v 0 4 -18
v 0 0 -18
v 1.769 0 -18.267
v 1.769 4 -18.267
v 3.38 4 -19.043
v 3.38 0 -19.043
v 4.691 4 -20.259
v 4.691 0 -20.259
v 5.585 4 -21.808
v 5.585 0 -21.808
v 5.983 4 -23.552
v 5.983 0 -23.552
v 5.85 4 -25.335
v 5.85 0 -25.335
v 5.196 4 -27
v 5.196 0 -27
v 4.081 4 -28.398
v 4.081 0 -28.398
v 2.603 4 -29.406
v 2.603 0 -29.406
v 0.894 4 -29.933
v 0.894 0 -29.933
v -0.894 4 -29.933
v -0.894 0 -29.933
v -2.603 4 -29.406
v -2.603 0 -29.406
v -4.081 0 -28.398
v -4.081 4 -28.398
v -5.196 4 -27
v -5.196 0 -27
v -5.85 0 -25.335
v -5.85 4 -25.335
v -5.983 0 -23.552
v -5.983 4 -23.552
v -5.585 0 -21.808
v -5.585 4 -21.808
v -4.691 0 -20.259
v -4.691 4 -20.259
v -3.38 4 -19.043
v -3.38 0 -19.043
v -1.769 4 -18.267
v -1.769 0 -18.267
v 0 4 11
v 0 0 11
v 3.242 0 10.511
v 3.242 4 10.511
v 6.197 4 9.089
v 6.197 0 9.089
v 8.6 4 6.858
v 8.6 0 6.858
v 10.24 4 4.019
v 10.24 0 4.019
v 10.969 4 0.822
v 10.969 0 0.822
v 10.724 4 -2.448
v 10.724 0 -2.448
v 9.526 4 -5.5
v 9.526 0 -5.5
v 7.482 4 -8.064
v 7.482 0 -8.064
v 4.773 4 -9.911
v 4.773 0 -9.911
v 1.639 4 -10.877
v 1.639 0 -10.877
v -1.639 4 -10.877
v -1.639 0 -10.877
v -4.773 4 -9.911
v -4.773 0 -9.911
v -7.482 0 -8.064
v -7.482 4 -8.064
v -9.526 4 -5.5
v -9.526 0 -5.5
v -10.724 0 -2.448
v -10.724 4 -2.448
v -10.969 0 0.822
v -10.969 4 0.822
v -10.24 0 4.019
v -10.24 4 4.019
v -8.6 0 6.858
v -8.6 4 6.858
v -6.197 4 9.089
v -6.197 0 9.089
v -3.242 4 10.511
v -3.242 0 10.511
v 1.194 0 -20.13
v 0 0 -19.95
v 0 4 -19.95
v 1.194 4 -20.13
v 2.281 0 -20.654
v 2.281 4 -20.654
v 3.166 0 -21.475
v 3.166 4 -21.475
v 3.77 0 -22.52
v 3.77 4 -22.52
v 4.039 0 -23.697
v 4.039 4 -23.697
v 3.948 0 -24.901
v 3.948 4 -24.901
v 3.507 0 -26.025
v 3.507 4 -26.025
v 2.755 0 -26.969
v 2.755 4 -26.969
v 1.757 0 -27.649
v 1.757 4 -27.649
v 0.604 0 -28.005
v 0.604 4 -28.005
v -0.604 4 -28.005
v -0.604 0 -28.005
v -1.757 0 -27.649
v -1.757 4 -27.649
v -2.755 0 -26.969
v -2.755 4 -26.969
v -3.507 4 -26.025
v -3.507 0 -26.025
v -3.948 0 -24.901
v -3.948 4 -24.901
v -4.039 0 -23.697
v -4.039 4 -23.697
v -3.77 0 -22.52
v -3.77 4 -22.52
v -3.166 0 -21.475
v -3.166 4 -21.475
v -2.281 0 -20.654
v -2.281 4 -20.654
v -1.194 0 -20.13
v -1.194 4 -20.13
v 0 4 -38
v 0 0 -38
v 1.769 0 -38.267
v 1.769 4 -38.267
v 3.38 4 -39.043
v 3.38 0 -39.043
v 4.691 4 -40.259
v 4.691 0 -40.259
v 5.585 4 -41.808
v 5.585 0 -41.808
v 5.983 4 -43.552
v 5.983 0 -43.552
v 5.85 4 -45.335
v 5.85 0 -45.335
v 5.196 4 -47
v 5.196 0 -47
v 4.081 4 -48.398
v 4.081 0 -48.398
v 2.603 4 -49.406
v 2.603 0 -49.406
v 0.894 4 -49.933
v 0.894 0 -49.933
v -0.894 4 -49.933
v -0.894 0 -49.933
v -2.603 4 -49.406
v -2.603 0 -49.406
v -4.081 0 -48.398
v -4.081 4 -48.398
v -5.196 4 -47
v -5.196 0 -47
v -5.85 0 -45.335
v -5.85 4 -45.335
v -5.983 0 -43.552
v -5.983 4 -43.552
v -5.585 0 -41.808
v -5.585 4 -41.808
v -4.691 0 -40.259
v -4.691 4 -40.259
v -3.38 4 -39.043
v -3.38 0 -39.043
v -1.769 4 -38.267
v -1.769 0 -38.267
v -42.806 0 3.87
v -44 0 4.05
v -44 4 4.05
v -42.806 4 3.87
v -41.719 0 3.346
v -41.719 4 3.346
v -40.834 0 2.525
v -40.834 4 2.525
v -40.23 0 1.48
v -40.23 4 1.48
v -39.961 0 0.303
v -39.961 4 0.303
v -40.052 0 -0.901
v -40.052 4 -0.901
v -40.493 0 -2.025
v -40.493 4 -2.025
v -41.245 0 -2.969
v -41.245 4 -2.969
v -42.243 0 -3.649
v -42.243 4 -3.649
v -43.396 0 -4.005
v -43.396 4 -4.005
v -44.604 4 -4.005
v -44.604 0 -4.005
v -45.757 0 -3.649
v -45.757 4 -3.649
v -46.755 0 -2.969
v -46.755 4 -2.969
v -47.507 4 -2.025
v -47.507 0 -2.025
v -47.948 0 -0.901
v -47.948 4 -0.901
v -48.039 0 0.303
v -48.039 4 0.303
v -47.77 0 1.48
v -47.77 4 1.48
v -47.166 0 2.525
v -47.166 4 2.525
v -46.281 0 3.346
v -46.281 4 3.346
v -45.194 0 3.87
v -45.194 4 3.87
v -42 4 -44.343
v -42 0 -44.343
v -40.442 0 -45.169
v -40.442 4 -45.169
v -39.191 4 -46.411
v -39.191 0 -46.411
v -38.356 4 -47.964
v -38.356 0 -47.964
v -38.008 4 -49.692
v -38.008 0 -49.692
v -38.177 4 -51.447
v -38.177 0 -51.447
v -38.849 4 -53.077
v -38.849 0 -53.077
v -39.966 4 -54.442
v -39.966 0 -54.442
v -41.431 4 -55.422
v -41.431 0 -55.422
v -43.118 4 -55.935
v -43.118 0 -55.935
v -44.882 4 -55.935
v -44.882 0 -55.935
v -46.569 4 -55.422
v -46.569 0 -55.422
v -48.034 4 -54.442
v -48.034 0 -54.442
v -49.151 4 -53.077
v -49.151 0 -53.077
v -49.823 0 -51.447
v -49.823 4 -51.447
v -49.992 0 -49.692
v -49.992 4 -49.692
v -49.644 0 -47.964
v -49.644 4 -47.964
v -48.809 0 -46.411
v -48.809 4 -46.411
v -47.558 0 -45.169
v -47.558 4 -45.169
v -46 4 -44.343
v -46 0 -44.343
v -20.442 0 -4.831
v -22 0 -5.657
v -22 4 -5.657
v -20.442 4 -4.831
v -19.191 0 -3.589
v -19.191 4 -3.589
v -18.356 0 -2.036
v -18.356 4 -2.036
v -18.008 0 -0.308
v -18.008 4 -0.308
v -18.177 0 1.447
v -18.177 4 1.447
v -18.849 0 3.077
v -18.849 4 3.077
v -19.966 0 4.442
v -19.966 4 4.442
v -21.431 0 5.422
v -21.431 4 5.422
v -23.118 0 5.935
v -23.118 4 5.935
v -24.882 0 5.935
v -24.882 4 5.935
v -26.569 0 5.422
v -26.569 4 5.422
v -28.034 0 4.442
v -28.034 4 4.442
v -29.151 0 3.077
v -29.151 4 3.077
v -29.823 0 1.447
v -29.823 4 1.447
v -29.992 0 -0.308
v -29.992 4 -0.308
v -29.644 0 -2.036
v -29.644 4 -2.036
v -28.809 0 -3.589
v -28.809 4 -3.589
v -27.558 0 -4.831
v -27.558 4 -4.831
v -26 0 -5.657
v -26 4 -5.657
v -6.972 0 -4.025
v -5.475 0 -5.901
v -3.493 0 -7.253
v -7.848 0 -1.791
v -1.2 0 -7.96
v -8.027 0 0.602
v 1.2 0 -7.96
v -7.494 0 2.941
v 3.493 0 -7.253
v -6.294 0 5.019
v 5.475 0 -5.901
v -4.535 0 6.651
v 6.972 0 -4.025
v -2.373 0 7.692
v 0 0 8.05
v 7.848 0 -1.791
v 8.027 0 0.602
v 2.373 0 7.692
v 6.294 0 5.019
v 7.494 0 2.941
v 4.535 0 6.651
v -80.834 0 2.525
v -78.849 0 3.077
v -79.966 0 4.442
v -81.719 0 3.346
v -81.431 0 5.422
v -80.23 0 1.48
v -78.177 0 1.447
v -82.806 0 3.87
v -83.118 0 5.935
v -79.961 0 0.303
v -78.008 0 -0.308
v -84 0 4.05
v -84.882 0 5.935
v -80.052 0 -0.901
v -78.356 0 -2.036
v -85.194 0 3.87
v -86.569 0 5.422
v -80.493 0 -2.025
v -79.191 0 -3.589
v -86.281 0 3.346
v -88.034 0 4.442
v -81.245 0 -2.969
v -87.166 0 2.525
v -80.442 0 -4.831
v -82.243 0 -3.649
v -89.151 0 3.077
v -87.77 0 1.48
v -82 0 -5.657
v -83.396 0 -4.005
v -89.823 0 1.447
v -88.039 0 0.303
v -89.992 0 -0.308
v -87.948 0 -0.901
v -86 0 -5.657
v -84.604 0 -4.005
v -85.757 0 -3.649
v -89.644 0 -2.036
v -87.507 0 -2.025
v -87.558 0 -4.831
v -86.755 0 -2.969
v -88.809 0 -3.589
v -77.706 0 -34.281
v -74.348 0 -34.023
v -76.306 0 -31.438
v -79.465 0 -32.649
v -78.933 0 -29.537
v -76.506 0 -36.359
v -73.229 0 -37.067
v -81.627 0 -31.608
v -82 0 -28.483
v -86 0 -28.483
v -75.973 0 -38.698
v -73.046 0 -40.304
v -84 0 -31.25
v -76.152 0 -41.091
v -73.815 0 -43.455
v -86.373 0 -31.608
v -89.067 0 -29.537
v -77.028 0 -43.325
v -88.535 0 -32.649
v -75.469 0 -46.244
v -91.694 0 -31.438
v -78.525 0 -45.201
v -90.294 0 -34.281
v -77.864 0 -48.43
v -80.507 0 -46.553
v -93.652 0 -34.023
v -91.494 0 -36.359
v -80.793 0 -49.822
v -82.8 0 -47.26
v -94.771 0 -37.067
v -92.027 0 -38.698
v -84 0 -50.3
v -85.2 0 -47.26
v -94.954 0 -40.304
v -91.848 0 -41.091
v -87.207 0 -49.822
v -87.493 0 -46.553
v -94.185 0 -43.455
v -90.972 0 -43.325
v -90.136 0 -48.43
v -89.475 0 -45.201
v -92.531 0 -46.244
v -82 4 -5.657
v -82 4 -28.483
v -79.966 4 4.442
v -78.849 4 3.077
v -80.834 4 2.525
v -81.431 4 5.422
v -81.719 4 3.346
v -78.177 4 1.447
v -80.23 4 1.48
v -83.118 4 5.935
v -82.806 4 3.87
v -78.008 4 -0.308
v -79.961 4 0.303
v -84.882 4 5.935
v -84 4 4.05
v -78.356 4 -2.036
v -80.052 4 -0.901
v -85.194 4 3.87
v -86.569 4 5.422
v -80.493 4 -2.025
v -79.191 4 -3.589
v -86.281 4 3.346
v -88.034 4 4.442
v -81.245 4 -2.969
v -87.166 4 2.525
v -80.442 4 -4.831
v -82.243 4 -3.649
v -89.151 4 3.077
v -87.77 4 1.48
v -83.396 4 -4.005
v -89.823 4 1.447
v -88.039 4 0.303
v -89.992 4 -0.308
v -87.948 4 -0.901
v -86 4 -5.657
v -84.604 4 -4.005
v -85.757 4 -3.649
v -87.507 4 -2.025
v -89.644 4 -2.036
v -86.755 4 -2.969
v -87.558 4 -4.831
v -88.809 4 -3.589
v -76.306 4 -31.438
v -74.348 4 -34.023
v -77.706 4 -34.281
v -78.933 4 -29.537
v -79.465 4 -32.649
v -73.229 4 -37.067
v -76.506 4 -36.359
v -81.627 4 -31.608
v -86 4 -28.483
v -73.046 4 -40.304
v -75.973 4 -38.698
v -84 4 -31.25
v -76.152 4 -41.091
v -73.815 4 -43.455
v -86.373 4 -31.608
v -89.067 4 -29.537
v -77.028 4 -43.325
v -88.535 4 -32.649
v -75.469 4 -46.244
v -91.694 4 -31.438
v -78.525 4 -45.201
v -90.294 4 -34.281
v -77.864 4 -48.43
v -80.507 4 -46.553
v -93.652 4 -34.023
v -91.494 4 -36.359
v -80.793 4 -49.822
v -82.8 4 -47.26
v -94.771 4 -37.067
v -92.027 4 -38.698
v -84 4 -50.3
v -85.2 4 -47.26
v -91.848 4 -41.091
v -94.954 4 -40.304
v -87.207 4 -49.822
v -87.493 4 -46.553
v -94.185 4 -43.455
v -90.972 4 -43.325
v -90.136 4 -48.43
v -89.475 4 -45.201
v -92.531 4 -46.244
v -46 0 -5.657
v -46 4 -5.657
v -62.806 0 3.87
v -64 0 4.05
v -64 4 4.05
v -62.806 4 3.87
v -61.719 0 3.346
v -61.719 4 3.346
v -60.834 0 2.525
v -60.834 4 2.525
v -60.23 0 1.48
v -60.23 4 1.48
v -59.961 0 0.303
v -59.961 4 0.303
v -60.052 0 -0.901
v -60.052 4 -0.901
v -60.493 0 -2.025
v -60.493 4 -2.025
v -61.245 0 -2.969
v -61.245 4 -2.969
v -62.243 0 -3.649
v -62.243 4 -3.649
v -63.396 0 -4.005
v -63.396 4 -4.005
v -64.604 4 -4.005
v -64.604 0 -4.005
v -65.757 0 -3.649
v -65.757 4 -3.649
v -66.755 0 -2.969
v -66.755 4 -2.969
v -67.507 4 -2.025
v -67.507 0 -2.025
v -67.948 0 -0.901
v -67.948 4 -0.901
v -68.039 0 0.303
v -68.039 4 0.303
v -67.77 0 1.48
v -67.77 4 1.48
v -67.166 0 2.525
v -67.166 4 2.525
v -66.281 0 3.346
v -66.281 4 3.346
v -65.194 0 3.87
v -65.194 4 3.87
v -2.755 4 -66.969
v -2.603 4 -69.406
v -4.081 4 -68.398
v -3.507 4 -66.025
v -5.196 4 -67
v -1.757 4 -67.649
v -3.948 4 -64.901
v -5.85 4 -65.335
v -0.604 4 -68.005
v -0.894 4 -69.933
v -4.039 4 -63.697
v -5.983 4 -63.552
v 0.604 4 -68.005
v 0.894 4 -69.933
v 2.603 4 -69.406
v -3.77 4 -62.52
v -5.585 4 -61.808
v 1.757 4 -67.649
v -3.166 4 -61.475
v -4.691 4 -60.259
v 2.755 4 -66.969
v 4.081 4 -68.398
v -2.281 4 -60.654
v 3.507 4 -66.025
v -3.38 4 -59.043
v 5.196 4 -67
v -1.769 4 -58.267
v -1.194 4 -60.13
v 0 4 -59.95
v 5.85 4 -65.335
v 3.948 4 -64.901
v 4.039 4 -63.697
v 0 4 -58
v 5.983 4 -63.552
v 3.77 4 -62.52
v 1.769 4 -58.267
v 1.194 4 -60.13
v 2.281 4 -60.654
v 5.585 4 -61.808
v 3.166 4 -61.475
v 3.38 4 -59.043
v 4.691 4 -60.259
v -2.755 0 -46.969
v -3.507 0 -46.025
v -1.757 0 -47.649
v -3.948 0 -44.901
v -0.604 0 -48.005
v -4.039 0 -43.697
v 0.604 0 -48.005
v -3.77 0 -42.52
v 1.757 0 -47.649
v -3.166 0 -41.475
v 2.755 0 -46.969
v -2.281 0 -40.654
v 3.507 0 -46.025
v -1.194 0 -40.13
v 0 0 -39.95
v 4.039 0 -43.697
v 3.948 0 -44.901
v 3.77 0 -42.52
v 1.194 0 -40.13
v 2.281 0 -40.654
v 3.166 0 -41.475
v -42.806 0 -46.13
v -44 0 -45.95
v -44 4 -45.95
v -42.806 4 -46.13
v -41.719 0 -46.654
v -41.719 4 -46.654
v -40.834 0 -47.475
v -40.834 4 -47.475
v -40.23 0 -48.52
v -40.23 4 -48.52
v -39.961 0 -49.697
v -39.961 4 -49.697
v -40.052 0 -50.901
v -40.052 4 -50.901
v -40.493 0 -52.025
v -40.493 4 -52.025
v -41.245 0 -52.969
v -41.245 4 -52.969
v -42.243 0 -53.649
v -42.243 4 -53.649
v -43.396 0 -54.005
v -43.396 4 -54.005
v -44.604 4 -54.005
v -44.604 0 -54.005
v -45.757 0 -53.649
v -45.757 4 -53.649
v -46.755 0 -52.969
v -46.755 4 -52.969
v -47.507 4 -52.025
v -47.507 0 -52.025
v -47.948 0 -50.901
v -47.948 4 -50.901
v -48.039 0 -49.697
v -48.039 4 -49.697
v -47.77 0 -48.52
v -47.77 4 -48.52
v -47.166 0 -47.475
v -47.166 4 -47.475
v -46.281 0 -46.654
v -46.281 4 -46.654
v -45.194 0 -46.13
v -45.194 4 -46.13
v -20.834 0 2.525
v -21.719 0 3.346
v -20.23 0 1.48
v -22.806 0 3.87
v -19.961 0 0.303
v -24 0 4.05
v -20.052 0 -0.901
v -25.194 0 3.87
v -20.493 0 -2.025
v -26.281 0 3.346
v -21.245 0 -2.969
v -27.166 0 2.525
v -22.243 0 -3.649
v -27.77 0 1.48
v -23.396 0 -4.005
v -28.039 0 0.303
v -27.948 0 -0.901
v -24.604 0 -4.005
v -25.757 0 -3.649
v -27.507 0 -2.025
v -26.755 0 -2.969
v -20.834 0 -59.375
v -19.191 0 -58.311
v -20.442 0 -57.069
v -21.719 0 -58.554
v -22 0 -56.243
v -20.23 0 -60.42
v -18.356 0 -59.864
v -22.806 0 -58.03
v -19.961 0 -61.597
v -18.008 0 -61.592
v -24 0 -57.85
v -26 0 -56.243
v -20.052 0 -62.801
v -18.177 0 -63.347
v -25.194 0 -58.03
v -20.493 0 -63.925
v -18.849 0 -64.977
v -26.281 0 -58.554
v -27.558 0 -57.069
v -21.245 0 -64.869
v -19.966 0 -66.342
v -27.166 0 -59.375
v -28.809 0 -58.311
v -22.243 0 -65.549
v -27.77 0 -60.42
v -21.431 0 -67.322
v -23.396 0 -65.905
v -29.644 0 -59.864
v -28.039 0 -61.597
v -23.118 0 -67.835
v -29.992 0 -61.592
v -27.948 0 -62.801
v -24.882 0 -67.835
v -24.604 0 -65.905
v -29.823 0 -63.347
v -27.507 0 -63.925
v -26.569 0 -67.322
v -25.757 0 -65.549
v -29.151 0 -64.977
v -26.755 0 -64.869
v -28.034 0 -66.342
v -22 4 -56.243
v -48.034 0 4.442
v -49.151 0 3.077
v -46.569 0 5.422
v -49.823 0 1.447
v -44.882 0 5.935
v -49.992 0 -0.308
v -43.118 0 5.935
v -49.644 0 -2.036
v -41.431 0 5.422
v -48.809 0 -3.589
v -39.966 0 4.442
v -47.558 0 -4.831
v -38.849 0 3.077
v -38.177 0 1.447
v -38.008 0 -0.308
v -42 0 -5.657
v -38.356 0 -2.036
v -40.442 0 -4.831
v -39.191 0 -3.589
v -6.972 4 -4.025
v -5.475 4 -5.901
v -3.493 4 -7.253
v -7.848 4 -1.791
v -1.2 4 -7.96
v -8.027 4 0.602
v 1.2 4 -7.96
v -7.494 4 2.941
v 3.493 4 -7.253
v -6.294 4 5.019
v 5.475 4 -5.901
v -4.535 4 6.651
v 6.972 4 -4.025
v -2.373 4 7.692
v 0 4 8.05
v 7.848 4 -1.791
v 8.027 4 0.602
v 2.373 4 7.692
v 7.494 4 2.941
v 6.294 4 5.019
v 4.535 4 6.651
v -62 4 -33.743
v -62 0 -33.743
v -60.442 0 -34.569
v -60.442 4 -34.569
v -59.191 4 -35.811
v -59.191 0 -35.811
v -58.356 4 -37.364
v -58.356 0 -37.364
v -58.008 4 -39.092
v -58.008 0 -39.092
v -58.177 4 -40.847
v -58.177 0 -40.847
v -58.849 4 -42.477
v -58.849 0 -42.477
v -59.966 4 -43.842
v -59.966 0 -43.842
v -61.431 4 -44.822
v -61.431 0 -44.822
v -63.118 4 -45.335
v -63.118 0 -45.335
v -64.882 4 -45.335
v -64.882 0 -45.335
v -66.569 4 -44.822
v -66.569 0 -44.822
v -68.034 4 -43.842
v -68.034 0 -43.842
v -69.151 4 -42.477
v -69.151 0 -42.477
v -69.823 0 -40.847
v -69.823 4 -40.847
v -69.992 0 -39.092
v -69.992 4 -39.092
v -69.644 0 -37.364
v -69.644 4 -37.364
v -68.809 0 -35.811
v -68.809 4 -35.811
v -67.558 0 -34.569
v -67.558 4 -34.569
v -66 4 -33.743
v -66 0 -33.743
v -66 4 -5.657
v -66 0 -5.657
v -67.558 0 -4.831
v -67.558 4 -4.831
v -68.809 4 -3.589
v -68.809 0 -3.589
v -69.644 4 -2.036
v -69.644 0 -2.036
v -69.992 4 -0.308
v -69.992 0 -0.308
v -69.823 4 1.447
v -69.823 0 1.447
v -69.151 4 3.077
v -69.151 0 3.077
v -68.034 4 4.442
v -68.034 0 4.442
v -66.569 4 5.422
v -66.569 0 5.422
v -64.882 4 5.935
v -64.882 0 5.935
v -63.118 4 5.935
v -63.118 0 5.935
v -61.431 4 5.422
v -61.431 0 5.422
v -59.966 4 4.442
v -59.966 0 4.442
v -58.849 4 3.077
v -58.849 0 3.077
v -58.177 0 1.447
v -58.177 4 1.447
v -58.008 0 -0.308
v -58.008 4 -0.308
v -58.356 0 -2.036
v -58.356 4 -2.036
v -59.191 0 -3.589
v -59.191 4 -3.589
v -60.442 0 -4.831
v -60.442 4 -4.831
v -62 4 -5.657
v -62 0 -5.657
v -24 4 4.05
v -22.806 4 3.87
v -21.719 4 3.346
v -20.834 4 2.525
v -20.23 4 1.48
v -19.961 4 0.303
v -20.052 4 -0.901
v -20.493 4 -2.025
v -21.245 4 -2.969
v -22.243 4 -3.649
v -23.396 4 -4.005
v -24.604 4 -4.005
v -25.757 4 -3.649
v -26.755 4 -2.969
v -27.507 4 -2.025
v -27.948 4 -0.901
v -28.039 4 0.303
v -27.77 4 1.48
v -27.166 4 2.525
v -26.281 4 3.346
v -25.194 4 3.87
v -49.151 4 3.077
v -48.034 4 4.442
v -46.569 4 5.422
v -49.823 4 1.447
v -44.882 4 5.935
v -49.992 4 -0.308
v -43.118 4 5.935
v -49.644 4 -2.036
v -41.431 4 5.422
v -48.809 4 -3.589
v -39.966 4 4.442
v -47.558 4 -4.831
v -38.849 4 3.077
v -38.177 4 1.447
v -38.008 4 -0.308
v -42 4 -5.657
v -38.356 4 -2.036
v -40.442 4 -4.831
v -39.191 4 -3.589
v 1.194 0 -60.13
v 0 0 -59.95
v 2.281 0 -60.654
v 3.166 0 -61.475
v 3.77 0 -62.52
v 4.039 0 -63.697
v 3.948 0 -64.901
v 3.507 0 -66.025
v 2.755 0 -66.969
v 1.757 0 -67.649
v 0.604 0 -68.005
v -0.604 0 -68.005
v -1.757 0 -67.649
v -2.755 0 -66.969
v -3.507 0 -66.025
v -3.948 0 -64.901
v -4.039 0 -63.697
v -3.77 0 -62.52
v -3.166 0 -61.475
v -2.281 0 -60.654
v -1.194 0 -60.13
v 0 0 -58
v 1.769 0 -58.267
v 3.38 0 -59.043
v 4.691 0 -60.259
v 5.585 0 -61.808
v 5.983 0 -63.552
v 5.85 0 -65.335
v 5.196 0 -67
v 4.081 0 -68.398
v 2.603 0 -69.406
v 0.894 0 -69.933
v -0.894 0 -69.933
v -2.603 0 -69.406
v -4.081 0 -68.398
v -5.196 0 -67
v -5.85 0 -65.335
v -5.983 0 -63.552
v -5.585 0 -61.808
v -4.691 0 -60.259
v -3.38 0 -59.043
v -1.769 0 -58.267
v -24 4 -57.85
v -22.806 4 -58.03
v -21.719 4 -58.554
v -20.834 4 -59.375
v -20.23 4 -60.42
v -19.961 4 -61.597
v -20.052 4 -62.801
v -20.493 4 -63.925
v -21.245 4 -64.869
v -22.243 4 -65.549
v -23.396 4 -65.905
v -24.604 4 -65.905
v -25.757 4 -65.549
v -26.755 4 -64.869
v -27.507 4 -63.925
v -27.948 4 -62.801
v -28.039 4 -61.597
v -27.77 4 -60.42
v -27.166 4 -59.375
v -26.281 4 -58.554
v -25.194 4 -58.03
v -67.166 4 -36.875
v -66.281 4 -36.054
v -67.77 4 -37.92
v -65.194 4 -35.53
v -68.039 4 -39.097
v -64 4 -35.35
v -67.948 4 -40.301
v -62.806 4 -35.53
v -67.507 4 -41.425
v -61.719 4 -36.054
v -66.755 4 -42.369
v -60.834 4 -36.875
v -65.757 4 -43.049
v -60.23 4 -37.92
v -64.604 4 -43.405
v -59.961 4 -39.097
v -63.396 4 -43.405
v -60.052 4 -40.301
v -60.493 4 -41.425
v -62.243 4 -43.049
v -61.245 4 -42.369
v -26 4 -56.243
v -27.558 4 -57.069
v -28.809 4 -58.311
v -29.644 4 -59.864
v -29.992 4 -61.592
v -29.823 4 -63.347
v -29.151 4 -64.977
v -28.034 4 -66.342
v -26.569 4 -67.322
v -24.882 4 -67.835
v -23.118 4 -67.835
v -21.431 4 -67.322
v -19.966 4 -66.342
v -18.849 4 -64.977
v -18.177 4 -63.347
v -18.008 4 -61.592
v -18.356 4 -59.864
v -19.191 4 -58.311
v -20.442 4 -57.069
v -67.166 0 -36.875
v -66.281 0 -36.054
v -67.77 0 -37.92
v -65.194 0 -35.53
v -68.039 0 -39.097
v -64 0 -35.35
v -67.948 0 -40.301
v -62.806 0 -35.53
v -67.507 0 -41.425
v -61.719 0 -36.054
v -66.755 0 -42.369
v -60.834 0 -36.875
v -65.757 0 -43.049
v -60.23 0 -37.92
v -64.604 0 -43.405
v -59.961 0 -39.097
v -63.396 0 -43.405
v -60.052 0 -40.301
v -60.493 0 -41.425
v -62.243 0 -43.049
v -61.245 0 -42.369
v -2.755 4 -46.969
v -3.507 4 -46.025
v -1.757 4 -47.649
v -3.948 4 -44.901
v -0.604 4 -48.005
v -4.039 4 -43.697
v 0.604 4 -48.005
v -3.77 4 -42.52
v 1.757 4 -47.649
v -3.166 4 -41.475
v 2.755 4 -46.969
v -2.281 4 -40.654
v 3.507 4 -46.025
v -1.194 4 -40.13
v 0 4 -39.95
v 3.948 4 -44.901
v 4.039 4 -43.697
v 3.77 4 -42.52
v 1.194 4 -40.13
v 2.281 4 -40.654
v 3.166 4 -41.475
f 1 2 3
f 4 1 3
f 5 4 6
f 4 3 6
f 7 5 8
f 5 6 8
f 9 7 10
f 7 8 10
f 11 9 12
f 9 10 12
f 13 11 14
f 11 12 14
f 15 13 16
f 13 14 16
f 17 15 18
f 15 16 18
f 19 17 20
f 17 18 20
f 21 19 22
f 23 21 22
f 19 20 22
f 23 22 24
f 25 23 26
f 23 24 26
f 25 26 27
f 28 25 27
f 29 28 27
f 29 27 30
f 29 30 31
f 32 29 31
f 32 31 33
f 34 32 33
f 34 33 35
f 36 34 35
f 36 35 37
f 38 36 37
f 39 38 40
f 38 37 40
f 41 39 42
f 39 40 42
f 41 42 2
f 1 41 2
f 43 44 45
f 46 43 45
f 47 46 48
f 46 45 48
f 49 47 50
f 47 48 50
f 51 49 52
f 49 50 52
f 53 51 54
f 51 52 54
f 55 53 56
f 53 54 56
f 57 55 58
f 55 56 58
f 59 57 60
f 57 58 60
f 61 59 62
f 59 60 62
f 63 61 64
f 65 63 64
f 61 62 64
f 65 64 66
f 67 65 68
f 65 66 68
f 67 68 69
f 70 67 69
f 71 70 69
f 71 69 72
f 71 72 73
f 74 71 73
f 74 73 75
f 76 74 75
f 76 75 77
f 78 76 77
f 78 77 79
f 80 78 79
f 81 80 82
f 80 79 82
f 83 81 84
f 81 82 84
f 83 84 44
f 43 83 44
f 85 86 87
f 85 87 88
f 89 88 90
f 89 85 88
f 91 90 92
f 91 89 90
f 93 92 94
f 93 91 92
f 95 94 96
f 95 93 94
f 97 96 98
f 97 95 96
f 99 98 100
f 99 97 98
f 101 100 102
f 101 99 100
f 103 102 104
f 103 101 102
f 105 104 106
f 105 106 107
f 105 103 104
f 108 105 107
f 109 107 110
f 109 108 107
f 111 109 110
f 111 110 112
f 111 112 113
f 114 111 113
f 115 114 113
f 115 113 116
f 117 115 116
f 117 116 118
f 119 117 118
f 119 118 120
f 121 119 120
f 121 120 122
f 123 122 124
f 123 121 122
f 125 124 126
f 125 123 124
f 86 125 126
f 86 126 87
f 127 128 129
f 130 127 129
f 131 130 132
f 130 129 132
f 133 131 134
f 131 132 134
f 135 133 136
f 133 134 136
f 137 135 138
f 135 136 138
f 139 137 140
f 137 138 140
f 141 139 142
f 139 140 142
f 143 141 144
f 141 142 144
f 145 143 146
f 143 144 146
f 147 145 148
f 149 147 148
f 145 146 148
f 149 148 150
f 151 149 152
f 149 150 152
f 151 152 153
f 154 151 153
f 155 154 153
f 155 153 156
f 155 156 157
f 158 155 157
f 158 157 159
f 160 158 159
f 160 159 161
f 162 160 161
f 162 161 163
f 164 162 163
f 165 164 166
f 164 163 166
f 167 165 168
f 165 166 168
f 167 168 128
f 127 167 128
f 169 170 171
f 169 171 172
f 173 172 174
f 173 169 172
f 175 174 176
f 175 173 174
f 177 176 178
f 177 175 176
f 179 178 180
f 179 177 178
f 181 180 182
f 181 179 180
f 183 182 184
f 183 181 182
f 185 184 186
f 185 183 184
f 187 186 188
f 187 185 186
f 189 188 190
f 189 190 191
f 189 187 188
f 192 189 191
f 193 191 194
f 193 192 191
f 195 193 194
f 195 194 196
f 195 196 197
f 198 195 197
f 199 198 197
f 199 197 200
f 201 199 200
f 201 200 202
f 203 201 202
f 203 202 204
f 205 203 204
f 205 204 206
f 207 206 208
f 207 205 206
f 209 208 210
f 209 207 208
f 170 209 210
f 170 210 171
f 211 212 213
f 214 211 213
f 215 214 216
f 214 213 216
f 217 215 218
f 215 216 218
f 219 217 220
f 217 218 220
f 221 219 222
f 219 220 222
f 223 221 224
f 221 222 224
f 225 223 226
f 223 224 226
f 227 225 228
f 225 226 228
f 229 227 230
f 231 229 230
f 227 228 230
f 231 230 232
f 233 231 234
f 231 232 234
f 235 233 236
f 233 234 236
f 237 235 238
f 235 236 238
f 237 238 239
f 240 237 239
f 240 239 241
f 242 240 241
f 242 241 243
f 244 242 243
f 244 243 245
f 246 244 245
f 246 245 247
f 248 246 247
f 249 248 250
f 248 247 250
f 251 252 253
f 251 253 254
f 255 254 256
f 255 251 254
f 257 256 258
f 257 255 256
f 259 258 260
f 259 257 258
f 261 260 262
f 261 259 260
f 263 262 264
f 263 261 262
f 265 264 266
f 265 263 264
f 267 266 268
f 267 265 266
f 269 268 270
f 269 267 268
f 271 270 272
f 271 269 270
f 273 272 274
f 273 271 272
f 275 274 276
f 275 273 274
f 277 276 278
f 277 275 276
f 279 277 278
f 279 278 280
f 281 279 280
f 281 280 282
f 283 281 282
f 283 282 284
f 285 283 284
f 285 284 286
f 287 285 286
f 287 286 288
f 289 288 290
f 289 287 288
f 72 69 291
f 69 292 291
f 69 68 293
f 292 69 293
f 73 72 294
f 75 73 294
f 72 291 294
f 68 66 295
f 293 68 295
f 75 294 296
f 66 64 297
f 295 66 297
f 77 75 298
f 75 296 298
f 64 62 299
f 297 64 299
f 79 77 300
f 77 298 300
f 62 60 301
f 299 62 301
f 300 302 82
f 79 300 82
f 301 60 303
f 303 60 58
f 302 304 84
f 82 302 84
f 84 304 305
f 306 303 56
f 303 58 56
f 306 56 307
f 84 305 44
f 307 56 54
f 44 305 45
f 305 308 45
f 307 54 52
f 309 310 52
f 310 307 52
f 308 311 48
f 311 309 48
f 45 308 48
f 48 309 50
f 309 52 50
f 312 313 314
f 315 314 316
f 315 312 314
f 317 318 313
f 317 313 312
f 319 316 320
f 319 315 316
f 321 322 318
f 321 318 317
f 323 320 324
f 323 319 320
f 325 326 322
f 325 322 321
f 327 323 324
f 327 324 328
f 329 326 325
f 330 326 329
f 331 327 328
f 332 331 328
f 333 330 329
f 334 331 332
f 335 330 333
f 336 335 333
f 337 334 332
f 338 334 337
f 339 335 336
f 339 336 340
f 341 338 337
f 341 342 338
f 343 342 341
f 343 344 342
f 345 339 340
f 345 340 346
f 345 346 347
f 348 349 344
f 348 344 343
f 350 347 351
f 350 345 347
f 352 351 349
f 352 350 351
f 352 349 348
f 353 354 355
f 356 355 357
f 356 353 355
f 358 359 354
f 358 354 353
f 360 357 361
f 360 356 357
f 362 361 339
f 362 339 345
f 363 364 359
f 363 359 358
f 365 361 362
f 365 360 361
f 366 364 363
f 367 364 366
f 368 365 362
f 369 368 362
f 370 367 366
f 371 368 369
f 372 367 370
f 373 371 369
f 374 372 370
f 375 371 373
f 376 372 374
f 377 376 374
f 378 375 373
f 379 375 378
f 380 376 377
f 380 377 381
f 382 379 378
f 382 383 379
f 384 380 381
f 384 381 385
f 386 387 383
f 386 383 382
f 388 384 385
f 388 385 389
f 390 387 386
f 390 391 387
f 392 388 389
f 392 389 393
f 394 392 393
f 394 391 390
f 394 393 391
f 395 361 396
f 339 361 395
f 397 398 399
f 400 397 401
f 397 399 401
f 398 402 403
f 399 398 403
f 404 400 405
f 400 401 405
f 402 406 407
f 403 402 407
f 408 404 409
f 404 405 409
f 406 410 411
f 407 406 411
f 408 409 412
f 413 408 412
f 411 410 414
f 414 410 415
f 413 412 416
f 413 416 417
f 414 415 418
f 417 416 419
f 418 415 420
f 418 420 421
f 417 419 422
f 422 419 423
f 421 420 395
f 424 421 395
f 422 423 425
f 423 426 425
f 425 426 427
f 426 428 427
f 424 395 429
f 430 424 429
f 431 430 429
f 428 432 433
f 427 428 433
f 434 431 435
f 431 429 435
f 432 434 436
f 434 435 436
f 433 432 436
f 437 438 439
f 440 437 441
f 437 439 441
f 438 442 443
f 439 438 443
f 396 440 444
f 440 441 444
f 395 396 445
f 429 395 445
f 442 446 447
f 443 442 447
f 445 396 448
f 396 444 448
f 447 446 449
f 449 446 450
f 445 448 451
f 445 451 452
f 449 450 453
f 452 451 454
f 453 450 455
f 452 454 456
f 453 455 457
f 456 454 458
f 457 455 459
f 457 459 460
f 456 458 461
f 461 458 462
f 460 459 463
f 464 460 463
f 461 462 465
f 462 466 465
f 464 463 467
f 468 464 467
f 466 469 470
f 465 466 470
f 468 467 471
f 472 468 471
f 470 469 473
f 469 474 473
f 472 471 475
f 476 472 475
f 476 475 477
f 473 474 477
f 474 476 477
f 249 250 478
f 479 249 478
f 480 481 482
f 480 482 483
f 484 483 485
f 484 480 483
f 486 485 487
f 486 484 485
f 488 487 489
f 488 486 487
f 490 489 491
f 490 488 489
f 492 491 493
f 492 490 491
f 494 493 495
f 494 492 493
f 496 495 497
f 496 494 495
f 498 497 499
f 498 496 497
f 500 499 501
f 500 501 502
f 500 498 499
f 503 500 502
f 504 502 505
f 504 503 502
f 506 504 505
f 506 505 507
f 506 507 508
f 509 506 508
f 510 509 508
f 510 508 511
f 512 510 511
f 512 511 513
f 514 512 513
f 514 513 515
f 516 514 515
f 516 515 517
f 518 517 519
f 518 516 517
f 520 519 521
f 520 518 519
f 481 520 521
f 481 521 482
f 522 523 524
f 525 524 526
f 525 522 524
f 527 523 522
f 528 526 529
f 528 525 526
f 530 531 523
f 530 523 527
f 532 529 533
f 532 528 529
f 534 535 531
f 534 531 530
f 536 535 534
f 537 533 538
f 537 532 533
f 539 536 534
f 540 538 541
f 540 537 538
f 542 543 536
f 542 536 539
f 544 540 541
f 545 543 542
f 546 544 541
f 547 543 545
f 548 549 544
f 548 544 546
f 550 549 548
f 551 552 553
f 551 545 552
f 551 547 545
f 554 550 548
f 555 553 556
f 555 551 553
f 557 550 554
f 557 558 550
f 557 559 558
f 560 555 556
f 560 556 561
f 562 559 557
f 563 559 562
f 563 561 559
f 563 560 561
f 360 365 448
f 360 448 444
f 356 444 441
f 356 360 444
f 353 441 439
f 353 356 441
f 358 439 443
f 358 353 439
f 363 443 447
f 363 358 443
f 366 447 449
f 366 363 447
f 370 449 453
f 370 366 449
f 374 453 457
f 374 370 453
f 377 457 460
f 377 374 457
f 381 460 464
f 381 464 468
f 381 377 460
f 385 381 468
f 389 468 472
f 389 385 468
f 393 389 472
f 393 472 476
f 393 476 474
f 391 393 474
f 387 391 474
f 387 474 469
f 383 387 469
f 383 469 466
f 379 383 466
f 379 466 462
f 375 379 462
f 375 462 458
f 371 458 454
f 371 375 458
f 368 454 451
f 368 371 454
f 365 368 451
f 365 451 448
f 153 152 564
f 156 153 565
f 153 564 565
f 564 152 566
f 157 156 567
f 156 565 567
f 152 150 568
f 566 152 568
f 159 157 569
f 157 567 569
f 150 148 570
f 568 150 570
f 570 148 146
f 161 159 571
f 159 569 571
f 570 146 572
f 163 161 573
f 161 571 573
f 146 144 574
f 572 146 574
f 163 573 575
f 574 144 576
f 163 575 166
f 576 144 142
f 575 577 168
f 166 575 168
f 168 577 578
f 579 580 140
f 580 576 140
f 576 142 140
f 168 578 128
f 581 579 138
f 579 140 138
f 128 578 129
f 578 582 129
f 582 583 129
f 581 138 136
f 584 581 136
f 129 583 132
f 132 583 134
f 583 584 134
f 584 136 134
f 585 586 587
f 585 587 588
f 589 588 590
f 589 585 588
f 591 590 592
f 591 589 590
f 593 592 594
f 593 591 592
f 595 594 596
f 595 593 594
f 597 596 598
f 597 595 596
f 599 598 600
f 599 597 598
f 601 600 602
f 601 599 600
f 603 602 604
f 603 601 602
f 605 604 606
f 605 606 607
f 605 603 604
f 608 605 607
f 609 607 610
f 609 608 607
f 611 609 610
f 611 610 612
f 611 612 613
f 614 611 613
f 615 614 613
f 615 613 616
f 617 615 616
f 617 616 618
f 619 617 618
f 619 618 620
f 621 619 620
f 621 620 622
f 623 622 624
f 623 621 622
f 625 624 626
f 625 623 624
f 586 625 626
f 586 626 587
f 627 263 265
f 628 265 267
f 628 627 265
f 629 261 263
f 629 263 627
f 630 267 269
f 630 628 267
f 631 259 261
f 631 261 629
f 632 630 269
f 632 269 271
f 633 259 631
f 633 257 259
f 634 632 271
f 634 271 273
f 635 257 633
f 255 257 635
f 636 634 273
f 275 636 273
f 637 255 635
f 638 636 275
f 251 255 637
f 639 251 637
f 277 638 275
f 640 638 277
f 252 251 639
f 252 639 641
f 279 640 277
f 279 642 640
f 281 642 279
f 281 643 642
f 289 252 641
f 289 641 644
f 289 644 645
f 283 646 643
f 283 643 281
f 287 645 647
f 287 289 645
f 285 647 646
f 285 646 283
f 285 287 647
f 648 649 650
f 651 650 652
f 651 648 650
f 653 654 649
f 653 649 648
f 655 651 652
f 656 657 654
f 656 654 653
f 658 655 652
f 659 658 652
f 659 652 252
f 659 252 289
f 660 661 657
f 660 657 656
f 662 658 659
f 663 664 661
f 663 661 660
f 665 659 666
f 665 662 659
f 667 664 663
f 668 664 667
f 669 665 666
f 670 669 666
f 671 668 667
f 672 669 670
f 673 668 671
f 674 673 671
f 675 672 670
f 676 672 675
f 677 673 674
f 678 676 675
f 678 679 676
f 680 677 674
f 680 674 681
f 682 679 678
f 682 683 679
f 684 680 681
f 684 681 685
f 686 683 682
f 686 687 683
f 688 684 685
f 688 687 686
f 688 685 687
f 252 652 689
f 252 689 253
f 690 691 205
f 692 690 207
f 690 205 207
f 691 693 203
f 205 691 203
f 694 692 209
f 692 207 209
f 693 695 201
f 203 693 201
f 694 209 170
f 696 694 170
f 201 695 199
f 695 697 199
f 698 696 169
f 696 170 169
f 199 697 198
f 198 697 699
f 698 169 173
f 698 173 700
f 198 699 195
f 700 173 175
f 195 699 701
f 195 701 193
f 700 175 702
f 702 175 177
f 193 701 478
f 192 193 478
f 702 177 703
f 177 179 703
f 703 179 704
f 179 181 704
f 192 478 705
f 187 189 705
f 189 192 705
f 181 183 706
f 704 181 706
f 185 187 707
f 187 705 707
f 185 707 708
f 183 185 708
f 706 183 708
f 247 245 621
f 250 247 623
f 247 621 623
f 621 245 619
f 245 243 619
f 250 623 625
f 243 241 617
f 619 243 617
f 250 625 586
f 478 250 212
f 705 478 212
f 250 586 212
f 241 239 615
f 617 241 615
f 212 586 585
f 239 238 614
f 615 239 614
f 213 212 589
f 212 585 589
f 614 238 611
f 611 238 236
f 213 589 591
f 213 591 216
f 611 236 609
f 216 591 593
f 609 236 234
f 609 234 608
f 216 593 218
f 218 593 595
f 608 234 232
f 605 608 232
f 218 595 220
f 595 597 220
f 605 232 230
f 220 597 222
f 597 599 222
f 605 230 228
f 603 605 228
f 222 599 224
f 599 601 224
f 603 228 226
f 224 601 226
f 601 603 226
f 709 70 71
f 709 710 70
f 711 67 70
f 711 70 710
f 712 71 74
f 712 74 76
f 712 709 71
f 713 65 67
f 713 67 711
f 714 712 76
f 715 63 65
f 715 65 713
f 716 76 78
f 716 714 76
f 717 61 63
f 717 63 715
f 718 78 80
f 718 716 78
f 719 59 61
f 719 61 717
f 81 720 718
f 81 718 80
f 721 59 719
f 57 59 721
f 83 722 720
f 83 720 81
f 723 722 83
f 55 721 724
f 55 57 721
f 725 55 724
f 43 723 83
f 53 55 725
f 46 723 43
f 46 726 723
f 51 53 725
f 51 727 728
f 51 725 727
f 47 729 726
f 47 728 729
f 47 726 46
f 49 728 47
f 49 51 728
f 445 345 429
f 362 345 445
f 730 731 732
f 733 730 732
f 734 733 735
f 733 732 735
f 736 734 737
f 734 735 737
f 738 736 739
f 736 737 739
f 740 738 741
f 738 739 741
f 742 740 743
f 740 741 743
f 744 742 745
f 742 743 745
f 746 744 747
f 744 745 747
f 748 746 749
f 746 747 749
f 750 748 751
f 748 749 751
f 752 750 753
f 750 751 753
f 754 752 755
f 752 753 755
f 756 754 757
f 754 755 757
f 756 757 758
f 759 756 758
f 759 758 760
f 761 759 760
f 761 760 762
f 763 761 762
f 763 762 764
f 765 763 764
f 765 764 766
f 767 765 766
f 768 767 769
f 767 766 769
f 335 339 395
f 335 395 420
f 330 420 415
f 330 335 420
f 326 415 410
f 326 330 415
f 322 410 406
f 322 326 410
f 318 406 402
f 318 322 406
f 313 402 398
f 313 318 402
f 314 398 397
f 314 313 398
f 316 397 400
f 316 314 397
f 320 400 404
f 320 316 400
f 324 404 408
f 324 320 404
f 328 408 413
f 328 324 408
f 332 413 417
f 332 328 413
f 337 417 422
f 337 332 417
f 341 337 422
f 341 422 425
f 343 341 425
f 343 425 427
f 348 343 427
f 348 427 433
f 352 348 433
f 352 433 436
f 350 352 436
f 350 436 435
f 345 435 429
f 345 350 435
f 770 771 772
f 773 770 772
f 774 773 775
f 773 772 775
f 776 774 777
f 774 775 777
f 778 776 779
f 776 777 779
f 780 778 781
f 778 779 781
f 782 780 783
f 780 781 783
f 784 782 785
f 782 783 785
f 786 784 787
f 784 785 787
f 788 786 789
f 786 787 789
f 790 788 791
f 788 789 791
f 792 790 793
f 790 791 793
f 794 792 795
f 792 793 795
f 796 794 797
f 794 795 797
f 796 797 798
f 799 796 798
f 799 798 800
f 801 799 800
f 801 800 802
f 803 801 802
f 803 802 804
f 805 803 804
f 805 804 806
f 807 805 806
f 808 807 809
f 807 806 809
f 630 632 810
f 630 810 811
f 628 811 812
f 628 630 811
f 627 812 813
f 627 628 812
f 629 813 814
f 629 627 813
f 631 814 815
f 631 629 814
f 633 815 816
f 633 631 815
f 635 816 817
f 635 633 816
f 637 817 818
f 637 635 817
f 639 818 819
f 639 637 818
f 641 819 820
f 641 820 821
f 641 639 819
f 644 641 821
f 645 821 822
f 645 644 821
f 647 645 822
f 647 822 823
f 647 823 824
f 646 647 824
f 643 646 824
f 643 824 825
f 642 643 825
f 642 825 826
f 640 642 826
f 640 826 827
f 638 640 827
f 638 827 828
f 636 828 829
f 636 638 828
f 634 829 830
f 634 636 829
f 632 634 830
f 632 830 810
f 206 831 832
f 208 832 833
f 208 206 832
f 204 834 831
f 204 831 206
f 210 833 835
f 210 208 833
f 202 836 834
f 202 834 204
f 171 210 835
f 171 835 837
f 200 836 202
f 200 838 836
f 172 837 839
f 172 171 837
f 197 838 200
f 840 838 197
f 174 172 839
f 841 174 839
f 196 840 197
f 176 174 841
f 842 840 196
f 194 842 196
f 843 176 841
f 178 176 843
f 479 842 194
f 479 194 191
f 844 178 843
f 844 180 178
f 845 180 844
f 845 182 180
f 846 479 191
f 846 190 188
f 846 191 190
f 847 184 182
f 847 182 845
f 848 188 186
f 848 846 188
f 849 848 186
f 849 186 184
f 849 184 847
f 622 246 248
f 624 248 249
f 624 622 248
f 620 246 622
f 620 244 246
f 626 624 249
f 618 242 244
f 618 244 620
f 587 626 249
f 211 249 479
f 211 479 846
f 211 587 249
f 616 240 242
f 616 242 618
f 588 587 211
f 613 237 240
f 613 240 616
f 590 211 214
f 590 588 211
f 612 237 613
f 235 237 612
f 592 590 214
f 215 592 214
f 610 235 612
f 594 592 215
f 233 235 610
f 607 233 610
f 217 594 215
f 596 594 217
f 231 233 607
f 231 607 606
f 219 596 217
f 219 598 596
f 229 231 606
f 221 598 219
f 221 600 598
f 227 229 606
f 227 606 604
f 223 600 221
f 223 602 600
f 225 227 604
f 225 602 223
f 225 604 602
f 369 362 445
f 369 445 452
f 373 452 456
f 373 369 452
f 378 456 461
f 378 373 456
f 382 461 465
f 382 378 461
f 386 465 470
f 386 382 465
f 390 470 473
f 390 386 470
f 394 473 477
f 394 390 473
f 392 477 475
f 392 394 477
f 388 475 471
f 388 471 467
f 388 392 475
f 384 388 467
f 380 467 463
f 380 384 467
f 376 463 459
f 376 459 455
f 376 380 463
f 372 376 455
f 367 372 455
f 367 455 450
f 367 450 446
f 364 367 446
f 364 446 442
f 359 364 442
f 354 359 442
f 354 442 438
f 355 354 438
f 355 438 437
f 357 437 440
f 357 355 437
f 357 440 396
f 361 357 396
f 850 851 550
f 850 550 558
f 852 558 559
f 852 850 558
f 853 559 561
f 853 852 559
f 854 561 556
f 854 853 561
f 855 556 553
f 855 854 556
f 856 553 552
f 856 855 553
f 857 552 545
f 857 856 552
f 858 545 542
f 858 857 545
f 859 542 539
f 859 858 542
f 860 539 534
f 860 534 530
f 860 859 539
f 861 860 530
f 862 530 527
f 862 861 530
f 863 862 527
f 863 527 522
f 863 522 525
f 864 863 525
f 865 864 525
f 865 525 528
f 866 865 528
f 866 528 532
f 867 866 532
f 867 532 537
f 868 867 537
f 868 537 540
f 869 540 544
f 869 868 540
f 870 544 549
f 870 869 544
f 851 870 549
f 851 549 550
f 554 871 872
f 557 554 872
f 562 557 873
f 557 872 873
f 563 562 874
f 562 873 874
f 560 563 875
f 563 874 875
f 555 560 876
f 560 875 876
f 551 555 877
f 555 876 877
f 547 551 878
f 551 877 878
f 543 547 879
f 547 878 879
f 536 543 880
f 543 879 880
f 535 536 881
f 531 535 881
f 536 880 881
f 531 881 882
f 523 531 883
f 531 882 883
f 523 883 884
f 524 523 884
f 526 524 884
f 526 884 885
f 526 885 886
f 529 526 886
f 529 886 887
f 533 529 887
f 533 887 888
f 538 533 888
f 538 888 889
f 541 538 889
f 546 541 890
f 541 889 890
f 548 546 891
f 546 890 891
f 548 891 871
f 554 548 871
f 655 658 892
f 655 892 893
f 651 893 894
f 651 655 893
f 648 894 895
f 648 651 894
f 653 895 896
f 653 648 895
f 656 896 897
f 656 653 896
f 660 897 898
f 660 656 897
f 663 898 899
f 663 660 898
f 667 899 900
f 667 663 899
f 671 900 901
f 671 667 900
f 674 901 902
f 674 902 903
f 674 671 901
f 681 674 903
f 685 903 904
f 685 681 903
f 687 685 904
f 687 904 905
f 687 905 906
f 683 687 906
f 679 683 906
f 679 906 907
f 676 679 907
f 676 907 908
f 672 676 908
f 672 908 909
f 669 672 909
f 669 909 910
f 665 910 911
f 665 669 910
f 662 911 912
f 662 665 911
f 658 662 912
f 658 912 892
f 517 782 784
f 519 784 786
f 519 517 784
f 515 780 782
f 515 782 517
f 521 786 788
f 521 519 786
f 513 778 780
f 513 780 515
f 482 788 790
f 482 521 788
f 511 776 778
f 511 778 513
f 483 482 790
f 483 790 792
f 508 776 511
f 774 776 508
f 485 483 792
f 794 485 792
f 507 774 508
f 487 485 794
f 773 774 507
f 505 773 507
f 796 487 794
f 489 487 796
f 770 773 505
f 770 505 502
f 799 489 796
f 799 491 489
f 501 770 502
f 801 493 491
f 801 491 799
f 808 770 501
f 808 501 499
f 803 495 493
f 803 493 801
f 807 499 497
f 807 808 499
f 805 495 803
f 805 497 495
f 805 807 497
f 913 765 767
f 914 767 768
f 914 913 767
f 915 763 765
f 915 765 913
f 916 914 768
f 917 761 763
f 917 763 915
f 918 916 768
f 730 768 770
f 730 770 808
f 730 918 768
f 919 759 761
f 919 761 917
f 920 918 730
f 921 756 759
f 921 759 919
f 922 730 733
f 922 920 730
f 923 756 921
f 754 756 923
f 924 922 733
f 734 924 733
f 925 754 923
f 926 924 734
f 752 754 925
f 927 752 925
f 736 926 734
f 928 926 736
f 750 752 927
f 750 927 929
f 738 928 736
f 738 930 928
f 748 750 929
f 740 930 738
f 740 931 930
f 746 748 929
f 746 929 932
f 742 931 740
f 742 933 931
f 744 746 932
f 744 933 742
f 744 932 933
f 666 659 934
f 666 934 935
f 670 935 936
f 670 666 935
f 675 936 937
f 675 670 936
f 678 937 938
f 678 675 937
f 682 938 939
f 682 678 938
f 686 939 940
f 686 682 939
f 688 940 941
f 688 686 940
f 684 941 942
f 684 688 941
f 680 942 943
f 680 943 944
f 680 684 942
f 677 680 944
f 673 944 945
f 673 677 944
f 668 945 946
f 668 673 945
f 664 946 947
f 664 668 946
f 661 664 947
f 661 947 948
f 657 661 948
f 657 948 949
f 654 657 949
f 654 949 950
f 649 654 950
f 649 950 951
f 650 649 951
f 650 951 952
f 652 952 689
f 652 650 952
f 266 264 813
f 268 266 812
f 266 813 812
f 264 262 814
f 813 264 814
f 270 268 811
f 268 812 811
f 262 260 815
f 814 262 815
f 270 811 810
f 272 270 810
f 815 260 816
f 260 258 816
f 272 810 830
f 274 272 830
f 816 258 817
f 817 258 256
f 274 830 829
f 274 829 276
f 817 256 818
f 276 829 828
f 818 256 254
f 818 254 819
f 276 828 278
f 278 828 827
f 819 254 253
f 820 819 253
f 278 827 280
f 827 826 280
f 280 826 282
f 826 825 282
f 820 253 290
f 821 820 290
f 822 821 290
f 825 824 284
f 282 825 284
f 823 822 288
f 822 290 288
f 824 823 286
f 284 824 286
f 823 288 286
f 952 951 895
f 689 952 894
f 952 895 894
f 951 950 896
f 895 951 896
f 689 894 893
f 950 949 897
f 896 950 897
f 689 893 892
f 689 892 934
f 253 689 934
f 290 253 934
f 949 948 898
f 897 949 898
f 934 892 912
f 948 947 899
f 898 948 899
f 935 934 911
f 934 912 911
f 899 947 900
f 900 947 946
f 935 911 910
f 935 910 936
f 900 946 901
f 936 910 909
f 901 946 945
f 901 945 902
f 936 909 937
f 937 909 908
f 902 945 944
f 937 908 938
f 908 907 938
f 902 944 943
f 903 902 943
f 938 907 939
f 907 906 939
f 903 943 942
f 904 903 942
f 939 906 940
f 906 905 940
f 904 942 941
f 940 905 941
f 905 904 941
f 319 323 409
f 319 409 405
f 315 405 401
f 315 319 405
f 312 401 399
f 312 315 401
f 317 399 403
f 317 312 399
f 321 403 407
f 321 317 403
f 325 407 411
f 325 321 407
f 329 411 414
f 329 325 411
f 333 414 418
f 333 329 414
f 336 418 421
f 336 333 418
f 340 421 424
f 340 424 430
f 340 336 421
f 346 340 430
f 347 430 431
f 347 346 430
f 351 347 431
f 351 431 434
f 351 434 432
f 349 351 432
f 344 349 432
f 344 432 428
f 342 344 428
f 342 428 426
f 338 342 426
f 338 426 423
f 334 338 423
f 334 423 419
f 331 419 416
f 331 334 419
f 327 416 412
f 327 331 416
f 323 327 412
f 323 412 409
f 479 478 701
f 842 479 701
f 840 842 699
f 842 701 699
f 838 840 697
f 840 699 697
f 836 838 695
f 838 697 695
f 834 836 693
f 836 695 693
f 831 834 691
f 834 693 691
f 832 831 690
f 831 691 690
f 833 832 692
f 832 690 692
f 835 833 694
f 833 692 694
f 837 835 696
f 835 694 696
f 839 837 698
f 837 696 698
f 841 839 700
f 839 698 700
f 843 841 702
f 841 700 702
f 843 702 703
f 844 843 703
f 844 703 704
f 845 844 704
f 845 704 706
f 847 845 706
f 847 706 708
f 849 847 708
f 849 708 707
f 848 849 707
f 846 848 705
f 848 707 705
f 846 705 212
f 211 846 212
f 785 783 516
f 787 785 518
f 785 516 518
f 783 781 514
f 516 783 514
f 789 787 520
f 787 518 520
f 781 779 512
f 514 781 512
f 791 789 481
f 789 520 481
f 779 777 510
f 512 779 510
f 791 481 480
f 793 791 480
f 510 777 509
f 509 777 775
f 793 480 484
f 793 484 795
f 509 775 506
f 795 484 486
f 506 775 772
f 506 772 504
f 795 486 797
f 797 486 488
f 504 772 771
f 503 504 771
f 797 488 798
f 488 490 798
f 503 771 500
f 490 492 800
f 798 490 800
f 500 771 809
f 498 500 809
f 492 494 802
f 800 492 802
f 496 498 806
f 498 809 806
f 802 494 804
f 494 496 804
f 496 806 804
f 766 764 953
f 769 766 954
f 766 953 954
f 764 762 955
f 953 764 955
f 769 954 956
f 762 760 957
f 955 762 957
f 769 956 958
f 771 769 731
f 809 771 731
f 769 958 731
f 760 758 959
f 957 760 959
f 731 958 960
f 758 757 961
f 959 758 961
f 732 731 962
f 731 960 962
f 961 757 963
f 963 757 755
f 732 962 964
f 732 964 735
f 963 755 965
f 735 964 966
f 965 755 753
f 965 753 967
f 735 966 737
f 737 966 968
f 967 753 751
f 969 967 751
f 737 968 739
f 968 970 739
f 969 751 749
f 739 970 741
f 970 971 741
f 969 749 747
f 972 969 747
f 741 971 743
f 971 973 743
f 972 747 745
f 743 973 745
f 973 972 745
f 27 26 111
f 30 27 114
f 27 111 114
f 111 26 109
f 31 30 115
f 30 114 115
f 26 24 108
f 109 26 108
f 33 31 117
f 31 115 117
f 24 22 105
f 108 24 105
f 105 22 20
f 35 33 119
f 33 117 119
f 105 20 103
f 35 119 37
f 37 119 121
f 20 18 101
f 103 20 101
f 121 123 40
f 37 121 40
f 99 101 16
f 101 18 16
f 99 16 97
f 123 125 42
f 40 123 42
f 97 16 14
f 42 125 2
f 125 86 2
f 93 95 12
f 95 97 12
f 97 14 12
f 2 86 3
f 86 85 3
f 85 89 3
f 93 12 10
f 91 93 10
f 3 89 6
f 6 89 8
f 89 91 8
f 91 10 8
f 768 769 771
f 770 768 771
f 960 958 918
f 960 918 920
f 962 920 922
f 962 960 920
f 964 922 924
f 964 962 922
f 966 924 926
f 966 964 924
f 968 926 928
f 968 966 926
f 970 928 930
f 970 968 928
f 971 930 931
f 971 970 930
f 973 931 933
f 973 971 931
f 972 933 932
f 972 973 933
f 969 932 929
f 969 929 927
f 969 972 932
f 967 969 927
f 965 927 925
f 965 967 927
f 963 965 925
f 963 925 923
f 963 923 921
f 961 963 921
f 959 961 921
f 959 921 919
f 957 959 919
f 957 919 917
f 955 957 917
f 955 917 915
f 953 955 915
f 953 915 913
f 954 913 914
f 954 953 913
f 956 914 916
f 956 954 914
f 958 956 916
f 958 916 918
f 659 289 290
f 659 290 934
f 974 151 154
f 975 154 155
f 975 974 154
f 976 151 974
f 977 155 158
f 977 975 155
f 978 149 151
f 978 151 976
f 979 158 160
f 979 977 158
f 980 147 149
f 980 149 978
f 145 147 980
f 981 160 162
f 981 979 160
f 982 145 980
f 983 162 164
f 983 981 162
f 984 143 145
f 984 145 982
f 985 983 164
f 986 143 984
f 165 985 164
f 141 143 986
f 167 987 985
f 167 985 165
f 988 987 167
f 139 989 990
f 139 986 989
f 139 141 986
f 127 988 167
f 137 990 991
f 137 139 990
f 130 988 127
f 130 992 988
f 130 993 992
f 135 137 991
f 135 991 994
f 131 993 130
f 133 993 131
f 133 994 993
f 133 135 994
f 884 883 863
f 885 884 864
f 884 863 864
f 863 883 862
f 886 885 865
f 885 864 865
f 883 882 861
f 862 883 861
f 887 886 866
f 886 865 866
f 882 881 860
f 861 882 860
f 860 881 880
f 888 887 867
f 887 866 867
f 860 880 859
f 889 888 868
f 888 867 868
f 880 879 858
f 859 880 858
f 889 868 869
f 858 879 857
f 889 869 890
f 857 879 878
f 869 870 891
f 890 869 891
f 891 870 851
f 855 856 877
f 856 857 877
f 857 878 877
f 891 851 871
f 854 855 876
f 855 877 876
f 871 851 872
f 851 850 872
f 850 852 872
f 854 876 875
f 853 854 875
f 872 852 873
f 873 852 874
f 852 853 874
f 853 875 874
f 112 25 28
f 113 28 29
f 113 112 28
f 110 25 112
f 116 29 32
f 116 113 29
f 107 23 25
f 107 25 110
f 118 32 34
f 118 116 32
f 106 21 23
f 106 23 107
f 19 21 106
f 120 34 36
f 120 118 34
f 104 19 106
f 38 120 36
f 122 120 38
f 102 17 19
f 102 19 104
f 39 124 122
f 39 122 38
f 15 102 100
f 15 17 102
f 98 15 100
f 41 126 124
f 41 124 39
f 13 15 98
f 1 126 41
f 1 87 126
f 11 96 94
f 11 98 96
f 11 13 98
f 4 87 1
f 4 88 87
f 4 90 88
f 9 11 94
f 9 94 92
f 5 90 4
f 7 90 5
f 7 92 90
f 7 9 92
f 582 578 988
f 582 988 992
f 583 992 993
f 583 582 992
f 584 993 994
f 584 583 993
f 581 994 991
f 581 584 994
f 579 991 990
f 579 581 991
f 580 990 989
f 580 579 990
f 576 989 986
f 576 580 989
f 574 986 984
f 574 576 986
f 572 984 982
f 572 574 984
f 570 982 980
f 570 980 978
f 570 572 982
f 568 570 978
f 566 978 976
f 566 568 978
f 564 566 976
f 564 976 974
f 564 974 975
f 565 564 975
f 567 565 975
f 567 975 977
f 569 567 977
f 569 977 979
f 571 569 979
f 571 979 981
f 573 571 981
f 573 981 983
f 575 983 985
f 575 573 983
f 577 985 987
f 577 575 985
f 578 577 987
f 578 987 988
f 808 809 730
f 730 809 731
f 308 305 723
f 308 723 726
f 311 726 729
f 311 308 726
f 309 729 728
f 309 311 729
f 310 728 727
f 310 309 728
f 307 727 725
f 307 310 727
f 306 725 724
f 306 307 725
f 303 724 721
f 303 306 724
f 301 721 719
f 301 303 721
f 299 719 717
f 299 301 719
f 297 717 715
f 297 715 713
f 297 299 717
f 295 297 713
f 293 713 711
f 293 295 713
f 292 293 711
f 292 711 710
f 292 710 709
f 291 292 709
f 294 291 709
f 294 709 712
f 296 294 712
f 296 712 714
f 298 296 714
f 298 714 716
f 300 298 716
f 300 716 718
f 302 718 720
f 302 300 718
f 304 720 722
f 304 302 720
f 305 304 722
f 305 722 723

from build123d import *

# Parameters (mm, degrees)
SKETCH_1_R        = 11
SKETCH_1_R_2      = 8.05
EXTRUDE_1_DEPTH   = 4
SKETCH_1_R_3      = 6
SKETCH_1_R_4      = 4.05
EXTRUDE_1_2_DEPTH = 4
EXTRUDE_1_3_DEPTH = 4
EXTRUDE_1_4_DEPTH = 4
EXTRUDE_1_5_DEPTH = 4
EXTRUDE_1_6_DEPTH = 4
EXTRUDE_1_7_DEPTH = 4
EXTRUDE_1_8_DEPTH = 4


with BuildPart() as part:
    # Эскиз1 → Бобышка-Вытянуть1 (new body)
    with BuildSketch(Plane(origin=(0, 0, 0), x_dir=(1, 0, 0), z_dir=(0, 1, 0))):
        with Locations(Location((0, 0, 0), (0, 0, 270))):
            Circle(SKETCH_1_R)
        with Locations(Location((0, 0, 0), (0, 0, 270))):
            Circle(SKETCH_1_R_2, mode=Mode.SUBTRACT)
    extrude(amount=EXTRUDE_1_DEPTH)


with BuildPart() as body_2:
    # Эскиз1 → Extrude 1 2 (new body)
    with BuildSketch(Plane(origin=(0, 0, 0), x_dir=(1, 0, 0), z_dir=(0, 1, 0))):
        with Locations(Location((0, 24, 0), (0, 0, 270))):
            Circle(SKETCH_1_R_3)
        with Locations(Location((0, 24, 0), (0, 0, 270))):
            Circle(SKETCH_1_R_4, mode=Mode.SUBTRACT)
    extrude(amount=EXTRUDE_1_2_DEPTH)


with BuildPart() as body_3:
    # Эскиз1 → Extrude 1 3 (new body)
    with BuildSketch(Plane(origin=(0, 0, 0), x_dir=(1, 0, 0), z_dir=(0, 1, 0))):
        with Locations(Location((0, 64, 0), (0, 0, 270))):
            Circle(SKETCH_1_R_3)
        with Locations(Location((0, 64, 0), (0, 0, 270))):
            Circle(SKETCH_1_R_4, mode=Mode.SUBTRACT)
    extrude(amount=EXTRUDE_1_3_DEPTH)


with BuildPart() as body_4:
    # Эскиз1 → Extrude 1 4 (new body)
    with BuildSketch(Plane(origin=(0, 0, 0), x_dir=(1, 0, 0), z_dir=(0, 1, 0))):
        with Locations(Location((0, 44, 0), (0, 0, 270))):
            Circle(SKETCH_1_R_3)
        with Locations(Location((0, 44, 0), (0, 0, 270))):
            Circle(SKETCH_1_R_4, mode=Mode.SUBTRACT)
    extrude(amount=EXTRUDE_1_4_DEPTH)


with BuildPart() as body_5:
    # Эскиз1 → Extrude 1 5 (new body)
    with BuildSketch(Plane(origin=(0, 0, 0), x_dir=(1, 0, 0), z_dir=(0, 1, 0))):
        with BuildLine():
            Line((-86, 5.656854249), (-86, 28.483346174))
            ThreePointArc((-86, 28.483346174), (-84, 50.3), (-82, 28.483346174))
            Line((-82, 28.483346174), (-82, 5.656854249))
            ThreePointArc((-82, 5.656854249), (-84, -6), (-86, 5.656854249))
        make_face()
        with Locations(Location((-84, 39.3, 0), (0, 0, 270))):
            Circle(SKETCH_1_R_2, mode=Mode.SUBTRACT)
        with Locations(Location((-84, 0, 0), (0, 0, 270))):
            Circle(SKETCH_1_R_4, mode=Mode.SUBTRACT)
    extrude(amount=EXTRUDE_1_5_DEPTH)


with BuildPart() as body_6:
    # Эскиз1 → Extrude 1 6 (new body)
    with BuildSketch(Plane(origin=(0, 0, 0), x_dir=(1, 0, 0), z_dir=(0, 1, 0))):
        with BuildLine():
            Line((-66, 33.743145751), (-66, 5.656854249))
            ThreePointArc((-66, 5.656854249), (-64, -6), (-62, 5.656854249))
            Line((-62, 5.656854249), (-62, 33.743145751))
            ThreePointArc((-62, 33.743145751), (-64, 45.4), (-66, 33.743145751))
        make_face()
        with Locations(Location((-64, 39.4, 0), (0, 0, 270))):
            Circle(SKETCH_1_R_4, mode=Mode.SUBTRACT)
        with Locations(Location((-64, 0, 0), (0, 0, 270))):
            Circle(SKETCH_1_R_4, mode=Mode.SUBTRACT)
    extrude(amount=EXTRUDE_1_6_DEPTH)


with BuildPart() as body_7:
    # Эскиз1 → Extrude 1 7 (new body)
    with BuildSketch(Plane(origin=(0, 0, 0), x_dir=(1, 0, 0), z_dir=(0, 1, 0))):
        with BuildLine():
            Line((-26, 5.656854249), (-26, 56.243145751))
            ThreePointArc((-26, 56.243145751), (-24, 67.9), (-22, 56.243145751))
            Line((-22, 56.243145751), (-22, 5.656854249))
            ThreePointArc((-22, 5.656854249), (-24, -6), (-26, 5.656854249))
        make_face()
        with Locations(Location((-24, 0, 0), (0, 0, 270))):
            Circle(SKETCH_1_R_4, mode=Mode.SUBTRACT)
        with Locations(Location((-24, 61.9, 0), (0, 0, 270))):
            Circle(SKETCH_1_R_4, mode=Mode.SUBTRACT)
    extrude(amount=EXTRUDE_1_7_DEPTH)


with BuildPart() as body_8:
    # Эскиз1 → Extrude 1 8 (new body)
    with BuildSketch(Plane(origin=(0, 0, 0), x_dir=(1, 0, 0), z_dir=(0, 1, 0))):
        with BuildLine():
            Line((-46, 44.343145751), (-46, 5.656854249))
            ThreePointArc((-46, 5.656854249), (-44, -6), (-42, 5.656854249))
            Line((-42, 5.656854249), (-42, 44.343145751))
            ThreePointArc((-42, 44.343145751), (-44, 56), (-46, 44.343145751))
        make_face()
        with Locations(Location((-44, 0, 0), (0, 0, 270))):
            Circle(SKETCH_1_R_4, mode=Mode.SUBTRACT)
        with Locations(Location((-44, 50, 0), (0, 0, 270))):
            Circle(SKETCH_1_R_4, mode=Mode.SUBTRACT)
    extrude(amount=EXTRUDE_1_8_DEPTH)


solid = Compound([part.part, body_2.part, body_3.part, body_4.part, body_5.part, body_6.part, body_7.part, body_8.part])
